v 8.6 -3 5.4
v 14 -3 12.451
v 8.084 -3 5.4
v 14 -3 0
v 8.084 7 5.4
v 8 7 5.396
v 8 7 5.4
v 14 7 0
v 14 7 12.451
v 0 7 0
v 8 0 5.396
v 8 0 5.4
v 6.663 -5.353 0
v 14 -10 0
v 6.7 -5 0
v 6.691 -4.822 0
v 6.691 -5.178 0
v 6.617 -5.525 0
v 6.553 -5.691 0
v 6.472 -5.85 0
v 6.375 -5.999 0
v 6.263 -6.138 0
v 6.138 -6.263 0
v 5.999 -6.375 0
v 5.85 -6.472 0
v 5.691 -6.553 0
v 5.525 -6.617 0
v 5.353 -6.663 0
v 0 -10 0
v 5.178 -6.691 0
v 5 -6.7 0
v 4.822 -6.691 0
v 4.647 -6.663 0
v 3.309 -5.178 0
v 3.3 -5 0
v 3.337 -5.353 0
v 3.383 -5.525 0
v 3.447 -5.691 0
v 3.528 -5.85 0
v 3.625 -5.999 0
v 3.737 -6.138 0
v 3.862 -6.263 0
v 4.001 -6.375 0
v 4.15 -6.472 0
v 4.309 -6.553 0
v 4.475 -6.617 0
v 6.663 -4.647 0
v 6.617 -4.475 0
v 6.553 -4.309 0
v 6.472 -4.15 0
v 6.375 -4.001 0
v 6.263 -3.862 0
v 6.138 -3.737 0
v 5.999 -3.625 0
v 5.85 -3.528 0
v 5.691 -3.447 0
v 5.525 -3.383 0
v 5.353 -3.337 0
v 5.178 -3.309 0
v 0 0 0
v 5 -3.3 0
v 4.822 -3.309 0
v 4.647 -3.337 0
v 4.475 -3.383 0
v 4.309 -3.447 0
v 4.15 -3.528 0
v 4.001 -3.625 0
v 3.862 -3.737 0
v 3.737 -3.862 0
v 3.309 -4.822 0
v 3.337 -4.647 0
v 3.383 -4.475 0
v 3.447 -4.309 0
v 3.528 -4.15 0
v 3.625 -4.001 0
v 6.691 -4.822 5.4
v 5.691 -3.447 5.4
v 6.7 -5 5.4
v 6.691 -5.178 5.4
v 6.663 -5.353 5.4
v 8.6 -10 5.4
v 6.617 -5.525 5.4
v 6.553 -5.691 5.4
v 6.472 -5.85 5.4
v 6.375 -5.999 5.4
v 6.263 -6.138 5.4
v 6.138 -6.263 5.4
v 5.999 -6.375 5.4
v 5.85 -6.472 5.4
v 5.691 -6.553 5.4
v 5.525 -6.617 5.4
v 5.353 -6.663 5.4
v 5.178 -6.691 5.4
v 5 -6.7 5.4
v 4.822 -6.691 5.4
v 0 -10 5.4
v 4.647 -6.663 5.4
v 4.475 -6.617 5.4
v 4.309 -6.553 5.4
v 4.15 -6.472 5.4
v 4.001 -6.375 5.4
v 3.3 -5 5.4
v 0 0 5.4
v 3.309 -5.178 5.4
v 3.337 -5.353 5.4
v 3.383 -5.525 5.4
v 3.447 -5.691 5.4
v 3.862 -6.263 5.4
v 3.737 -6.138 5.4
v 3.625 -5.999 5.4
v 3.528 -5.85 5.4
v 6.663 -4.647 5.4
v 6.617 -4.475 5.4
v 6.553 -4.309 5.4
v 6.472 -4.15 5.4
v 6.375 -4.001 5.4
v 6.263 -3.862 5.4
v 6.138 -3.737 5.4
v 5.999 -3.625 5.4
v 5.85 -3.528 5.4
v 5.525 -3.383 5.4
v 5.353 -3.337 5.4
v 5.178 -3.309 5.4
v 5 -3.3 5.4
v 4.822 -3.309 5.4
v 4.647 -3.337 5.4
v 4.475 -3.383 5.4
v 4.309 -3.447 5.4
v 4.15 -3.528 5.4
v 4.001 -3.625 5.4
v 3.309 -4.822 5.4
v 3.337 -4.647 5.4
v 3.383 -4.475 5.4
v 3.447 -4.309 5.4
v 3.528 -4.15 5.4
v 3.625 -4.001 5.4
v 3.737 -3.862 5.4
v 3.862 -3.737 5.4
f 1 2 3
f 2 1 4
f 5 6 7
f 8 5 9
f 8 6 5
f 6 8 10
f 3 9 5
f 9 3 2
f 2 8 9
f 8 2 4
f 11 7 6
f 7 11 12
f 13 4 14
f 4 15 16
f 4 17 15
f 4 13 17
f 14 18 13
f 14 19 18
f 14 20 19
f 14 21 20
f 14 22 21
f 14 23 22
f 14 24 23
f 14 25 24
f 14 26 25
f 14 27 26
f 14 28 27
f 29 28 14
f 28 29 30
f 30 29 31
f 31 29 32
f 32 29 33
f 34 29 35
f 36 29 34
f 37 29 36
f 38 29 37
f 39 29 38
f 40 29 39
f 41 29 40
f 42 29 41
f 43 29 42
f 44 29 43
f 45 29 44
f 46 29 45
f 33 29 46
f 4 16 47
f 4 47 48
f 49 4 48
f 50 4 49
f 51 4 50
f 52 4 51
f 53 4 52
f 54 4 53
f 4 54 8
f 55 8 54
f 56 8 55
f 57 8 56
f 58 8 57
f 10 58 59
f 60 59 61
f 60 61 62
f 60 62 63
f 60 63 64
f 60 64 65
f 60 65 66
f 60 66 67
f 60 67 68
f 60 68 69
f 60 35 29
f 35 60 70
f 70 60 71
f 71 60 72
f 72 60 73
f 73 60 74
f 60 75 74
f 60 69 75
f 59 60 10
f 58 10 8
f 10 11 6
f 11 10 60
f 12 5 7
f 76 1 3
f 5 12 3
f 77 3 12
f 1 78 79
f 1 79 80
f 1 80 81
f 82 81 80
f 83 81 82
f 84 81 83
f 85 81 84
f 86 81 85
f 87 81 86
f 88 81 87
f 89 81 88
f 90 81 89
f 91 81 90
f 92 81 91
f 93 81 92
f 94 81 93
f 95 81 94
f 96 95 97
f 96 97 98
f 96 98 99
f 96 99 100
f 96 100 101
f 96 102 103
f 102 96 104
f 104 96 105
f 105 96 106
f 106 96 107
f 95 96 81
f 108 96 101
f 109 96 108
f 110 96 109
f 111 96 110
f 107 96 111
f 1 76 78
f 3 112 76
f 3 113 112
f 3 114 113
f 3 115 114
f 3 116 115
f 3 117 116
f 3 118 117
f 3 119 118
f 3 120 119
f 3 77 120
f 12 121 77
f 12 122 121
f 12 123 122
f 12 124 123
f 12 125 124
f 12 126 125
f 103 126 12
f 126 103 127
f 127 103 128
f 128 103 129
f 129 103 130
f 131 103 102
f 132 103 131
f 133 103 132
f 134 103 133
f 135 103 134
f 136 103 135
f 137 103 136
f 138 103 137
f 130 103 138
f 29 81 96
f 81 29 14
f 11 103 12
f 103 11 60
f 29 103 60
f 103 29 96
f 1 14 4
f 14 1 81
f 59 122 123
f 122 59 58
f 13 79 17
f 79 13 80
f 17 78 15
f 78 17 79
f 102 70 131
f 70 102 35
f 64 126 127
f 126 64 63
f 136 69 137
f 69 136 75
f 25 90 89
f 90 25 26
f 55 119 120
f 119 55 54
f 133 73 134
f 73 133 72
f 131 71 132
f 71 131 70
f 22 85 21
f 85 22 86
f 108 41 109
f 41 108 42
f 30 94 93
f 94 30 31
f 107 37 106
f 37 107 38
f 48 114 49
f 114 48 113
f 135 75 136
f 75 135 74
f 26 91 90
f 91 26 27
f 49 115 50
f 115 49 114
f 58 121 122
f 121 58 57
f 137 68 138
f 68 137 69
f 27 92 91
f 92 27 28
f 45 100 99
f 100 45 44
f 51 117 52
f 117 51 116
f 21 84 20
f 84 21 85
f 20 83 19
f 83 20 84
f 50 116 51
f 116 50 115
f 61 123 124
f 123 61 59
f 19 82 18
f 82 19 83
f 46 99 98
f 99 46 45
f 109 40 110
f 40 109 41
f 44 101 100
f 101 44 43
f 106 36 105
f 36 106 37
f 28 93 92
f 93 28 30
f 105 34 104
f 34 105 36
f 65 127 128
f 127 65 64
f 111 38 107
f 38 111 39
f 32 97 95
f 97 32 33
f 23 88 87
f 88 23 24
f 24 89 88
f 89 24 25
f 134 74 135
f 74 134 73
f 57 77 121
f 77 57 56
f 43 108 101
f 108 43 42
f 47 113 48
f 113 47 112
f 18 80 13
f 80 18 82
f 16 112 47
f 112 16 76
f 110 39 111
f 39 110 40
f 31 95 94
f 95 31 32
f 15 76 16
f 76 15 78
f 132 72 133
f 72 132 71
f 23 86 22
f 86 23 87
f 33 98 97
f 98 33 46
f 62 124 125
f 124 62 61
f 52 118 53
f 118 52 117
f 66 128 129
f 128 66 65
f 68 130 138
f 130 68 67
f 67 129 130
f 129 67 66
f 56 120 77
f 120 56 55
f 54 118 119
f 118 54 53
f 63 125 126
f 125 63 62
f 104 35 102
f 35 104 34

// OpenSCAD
// Real Lonely T-Rex Game: Loop Motor Mounter
// Copyright (C) 2017, Uri Shaked and Ariella Eliassaf

$fn=60;

side = -1; // 1 for right, -1 for left

rotate([90,0,0]) {
    translate([0,0,7 * side])
    union() {
        translate([8,5.3,0])
        intersection() {
            rotate([0,0,-40])
                cube([6,12,10]);
    
            cube([6,12,10]);
        };
        
        translate([8,0,0])
        cube([6,5.4,10]);
    
        translate([0,0,0])
        difference() {
            cube([8,5.4,10]);

            rotate([0,0,34])
            cube([10,6,10]);
        };

        translate([8,0,0])
        cube([6,5.4,10]);
    }
    

    difference() {
        cube([14,5.4,10]);

        translate([14,0,0])
        rotate([0,0,45])
            cube([6,12,10]);


        translate([5,7,5])
        rotate([90,0,0])
        cylinder(r=1.7,h=10);
    }
}
